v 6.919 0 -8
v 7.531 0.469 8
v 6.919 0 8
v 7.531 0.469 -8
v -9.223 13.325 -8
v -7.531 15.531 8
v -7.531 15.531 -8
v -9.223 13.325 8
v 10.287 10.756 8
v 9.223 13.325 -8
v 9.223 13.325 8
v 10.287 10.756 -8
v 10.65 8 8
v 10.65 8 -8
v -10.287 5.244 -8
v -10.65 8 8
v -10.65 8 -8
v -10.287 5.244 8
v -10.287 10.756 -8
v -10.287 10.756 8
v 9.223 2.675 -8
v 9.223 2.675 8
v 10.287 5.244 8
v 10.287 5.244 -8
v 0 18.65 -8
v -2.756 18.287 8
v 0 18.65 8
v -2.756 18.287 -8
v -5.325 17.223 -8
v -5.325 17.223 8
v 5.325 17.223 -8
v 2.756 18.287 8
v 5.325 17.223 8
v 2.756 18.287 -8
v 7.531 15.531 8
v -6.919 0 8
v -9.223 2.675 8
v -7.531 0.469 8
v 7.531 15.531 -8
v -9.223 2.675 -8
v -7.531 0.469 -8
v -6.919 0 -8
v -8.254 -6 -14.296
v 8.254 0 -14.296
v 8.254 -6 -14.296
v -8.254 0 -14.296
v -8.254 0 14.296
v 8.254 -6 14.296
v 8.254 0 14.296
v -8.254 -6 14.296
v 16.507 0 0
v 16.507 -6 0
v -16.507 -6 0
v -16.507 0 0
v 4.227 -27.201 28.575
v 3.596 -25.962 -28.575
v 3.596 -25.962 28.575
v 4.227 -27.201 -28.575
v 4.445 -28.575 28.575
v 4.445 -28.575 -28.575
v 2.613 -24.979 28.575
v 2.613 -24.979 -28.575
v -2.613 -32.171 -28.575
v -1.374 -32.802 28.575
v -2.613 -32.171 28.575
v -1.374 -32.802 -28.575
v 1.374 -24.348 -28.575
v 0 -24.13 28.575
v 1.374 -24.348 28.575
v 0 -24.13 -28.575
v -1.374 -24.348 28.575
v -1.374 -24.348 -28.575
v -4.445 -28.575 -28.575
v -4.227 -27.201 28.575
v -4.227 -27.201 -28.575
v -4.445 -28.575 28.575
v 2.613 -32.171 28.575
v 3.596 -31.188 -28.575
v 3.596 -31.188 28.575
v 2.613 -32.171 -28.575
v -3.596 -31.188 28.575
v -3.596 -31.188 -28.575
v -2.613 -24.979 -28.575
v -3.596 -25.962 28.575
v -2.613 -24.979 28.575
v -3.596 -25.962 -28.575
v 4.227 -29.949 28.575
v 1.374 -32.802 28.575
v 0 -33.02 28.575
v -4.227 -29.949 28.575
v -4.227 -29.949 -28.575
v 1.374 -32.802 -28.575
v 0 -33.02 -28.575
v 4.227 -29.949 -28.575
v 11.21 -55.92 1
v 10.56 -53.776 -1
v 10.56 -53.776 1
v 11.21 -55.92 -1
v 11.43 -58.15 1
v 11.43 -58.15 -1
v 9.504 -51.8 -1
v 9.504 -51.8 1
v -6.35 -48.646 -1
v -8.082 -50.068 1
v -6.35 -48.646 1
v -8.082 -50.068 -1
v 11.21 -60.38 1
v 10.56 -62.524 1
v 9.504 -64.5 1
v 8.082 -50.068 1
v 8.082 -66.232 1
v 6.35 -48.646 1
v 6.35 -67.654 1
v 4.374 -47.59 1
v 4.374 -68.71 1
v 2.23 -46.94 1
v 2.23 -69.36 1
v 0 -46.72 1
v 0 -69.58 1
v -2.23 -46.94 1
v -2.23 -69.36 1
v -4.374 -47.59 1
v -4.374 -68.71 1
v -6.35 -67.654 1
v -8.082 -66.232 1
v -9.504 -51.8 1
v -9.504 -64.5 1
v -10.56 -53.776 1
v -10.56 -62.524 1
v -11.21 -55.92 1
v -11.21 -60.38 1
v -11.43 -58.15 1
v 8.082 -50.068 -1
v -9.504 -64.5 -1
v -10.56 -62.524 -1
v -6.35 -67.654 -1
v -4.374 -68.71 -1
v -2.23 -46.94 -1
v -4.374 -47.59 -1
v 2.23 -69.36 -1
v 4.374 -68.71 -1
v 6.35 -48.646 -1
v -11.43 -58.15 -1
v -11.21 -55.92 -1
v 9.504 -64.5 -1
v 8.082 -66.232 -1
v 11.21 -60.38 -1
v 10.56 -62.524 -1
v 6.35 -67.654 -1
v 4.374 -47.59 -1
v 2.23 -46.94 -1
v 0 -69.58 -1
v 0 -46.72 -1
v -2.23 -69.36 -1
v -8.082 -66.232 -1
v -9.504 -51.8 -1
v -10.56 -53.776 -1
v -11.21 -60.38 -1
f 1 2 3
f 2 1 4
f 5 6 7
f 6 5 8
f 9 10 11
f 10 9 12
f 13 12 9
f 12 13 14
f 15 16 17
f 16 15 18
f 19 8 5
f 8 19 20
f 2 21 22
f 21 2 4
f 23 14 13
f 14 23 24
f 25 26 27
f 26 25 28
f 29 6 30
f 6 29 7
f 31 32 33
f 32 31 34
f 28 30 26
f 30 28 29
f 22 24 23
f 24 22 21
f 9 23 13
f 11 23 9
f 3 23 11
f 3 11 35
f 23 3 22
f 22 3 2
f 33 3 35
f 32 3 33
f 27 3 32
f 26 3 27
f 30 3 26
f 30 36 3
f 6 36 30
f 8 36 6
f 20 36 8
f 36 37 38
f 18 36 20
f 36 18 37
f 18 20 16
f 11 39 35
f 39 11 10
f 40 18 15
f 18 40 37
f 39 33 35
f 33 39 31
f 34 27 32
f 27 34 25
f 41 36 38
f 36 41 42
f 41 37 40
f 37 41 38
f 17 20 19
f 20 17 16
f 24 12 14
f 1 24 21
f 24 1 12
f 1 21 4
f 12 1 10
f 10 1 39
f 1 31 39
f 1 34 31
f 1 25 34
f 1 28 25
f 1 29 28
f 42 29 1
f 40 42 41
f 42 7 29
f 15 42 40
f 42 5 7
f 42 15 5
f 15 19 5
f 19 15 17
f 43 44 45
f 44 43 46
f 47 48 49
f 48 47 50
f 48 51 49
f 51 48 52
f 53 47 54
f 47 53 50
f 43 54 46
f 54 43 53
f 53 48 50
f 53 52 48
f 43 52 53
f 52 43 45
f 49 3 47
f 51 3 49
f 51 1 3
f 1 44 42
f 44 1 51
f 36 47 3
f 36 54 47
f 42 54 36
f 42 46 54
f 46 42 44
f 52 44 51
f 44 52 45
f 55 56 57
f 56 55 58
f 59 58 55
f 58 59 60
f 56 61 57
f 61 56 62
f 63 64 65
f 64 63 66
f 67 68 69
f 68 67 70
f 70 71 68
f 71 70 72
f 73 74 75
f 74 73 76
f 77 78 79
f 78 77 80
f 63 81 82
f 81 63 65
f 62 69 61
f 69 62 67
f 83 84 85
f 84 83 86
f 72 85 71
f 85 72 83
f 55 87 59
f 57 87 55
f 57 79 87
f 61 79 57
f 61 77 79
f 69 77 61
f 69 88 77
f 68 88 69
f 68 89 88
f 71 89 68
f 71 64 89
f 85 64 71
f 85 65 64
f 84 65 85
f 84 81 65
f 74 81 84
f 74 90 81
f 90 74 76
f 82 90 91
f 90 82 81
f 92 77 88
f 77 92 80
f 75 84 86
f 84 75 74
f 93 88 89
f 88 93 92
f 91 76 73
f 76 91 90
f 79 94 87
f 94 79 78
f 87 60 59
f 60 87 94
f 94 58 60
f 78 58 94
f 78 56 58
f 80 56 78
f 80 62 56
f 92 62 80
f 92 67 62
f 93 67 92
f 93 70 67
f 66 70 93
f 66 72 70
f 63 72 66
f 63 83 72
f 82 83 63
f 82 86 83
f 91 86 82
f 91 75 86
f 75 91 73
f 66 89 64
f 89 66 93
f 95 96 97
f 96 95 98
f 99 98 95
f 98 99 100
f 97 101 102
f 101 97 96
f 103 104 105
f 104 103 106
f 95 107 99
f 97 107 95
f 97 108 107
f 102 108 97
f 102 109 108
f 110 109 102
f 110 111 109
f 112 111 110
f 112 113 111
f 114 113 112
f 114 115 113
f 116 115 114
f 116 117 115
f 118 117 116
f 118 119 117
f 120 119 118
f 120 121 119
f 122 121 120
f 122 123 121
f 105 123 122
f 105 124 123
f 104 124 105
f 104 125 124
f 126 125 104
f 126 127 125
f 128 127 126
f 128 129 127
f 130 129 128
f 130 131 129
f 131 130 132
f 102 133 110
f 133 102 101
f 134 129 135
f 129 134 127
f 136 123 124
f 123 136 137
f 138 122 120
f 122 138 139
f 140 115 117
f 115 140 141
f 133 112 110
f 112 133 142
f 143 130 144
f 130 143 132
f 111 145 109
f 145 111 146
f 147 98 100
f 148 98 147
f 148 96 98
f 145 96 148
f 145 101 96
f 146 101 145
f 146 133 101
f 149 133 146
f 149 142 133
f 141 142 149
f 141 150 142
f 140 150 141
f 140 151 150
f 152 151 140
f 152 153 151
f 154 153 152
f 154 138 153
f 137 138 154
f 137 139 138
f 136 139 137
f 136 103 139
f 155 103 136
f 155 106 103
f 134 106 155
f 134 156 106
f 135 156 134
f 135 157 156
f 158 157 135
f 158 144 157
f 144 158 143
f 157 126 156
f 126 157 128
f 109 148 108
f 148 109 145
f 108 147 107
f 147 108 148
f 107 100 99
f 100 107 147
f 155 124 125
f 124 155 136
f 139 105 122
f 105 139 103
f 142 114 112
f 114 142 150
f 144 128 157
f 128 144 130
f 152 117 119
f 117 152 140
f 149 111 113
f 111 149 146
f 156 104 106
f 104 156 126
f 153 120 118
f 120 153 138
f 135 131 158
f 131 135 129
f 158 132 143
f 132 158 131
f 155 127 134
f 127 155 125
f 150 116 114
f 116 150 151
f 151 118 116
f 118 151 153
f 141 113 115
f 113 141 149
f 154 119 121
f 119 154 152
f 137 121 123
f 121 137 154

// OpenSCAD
// Auto-generated by scripts/author_from_manifest.py (Phase D.3).
// Source: data/phase_d_manifest.json (sku_intent='reliable-f1fr56-qr-pendent-175f').
// Do not hand-edit — regenerate from the manifest.
//
// @part reliable_f1fr56_qr_pendent_175f
// @kind sprinkler_head
// @category head.pendant.k56
// @display-name "Reliable F1FR56 QR Pendent K5.6 175°F"
// @mfg reliable_automatic_sprinkler
// @mfg-pn F1FR56
// @listing UL FM
// @hazard-classes LH OH1
// @price-usd 14.25
// @install-minutes 8
// @crew journeyman
// @k-factor 5.6
// @orientation pendant
// @response quick
// @temperature 175F
// @param size_in number default=0.5 label="Size" unit="in"
// @port inlet position=[0,0.014,0] direction=[0,1,0] style=NPT_threaded size_in=0.5 role=drop

size_in = 0.5;
k_factor = 5.6;

length_mm   = 57.15;
body_dia_mm = 25.40;
thread_od   = 21.3;
thread_len  = 16;
deflector_d = body_dia_mm * 0.9;

 union() {
    translate([0, thread_len/2, 0])
        cylinder(h = thread_len, d = thread_od, center = true, $fn = 24);
    translate([0, -3, 0])
        rotate([90, 0, 0])
        cylinder(h = 6, d = thread_od * 1.55, $fn = 6, center = true);
    translate([0, -length_mm/2, 0])
        cylinder(h = length_mm, d = body_dia_mm * 0.35, center = true, $fn = 20);
    translate([0, -length_mm - 1, 0])
        cylinder(h = 2, d = deflector_d, center = true, $fn = 32);
}
